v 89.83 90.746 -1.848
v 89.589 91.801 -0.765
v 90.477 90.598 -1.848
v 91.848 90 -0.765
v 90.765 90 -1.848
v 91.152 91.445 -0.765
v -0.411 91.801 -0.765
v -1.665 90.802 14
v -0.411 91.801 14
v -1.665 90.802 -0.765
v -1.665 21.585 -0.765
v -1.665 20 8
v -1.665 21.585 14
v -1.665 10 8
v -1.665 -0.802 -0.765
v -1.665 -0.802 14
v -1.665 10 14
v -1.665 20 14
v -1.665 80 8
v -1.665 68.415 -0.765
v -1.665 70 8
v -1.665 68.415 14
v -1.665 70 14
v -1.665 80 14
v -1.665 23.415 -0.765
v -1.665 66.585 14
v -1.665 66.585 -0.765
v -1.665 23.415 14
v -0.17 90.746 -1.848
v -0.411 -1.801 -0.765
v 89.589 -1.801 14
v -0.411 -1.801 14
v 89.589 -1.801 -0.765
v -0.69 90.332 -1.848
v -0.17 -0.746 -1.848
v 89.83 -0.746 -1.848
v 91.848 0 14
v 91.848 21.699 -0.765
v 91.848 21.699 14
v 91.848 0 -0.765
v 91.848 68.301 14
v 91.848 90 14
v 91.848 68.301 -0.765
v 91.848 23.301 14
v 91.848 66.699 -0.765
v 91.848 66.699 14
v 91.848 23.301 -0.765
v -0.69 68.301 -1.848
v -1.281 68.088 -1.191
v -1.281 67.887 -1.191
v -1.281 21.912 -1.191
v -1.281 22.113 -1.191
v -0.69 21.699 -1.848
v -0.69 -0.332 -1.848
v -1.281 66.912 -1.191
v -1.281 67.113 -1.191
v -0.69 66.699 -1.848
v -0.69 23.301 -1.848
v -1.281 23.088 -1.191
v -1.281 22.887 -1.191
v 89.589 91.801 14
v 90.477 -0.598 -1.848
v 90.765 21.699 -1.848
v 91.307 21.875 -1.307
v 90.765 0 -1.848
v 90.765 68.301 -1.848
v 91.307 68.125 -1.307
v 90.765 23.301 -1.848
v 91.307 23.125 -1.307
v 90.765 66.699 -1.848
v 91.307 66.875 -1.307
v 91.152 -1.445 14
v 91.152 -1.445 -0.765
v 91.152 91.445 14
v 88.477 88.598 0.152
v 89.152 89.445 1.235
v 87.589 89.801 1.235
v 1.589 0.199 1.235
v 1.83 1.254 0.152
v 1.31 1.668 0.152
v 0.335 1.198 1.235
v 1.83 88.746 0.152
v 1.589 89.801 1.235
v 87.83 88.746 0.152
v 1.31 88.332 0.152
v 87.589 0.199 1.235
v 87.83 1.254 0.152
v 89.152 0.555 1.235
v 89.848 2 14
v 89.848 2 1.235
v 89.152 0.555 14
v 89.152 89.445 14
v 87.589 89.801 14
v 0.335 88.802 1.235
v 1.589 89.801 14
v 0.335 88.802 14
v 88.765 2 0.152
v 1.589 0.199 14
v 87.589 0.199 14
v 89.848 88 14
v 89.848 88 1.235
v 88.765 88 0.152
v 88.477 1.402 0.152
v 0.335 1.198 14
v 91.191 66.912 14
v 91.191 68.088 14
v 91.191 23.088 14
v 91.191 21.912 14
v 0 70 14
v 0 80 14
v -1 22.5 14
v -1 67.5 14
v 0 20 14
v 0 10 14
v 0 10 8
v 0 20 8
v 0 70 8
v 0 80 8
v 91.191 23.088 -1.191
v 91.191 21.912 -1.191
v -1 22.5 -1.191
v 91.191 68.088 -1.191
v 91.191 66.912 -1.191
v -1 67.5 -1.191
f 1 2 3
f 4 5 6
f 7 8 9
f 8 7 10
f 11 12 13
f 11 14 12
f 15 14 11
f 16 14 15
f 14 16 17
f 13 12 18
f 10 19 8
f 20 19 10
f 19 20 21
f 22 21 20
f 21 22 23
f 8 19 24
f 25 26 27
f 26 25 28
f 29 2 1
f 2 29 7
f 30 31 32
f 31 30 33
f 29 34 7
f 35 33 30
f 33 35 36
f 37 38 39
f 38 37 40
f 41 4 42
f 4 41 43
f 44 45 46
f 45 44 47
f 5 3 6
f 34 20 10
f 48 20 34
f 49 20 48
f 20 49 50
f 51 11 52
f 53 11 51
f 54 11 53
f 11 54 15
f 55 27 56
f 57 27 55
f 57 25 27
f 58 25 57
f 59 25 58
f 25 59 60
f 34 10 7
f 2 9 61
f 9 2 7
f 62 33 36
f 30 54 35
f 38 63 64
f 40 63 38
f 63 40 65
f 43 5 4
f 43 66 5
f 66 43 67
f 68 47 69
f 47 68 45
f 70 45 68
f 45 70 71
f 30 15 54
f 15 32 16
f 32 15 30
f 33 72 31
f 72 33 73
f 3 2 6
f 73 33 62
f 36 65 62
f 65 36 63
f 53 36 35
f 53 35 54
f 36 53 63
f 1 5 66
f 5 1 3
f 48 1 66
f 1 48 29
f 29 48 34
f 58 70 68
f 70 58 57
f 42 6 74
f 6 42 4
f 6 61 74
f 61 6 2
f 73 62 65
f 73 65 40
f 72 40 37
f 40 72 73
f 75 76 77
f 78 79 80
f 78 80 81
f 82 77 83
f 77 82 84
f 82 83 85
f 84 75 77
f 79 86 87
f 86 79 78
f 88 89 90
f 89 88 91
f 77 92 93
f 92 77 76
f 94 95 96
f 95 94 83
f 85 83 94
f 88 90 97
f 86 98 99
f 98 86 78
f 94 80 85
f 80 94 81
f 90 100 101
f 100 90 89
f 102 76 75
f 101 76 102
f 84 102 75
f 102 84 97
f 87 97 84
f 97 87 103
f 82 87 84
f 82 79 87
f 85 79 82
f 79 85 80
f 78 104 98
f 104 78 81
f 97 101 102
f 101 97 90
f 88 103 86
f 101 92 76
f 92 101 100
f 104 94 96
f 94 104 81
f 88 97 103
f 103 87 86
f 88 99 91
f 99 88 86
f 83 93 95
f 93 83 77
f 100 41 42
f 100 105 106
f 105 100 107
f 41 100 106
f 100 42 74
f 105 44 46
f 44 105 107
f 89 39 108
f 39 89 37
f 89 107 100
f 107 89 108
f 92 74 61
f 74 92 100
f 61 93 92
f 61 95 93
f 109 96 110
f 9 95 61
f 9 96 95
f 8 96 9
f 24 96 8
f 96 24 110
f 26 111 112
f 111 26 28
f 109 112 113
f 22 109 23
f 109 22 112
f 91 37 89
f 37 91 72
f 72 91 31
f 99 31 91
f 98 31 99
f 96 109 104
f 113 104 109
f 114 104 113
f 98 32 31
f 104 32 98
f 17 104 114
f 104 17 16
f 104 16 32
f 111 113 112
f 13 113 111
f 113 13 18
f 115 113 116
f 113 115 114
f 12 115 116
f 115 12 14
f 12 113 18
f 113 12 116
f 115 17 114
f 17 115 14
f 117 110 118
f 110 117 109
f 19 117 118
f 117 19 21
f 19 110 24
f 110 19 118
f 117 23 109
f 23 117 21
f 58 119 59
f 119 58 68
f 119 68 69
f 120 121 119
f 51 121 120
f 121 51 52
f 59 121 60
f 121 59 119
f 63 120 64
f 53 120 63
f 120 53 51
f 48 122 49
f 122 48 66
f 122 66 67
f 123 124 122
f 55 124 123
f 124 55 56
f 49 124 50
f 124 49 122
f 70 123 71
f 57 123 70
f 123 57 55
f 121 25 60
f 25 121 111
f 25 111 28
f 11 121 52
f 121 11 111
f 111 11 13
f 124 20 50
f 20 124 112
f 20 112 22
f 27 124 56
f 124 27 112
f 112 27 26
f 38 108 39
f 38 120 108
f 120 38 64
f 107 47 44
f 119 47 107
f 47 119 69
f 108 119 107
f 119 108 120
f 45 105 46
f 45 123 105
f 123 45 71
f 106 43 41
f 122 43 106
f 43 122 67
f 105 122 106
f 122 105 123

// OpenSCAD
module box_part(height, hinge_height, hinge_width) {
    corner_radius=4;
    wall_thickness=2;
    cube_size=90;
    difference() {
        minkowski() {
          sphere(d=corner_radius);
          cube([cube_size,cube_size,height]);
        }
        //hollow
        translate([wall_thickness, wall_thickness, wall_thickness]) {
            minkowski() {
              sphere(d=corner_radius);
              cube([cube_size-2*wall_thickness, cube_size-2*wall_thickness, height + corner_radius]);
            }
        }
        translate([0-corner_radius, 0-corner_radius, height]) cube([cube_size+2*corner_radius,cube_size + 2*corner_radius,corner_radius]);
        
        translate([-wall_thickness/2, cube_size/6, height-hinge_height/2]) cube([wall_thickness, hinge_width, hinge_height], center=true);
        translate([-wall_thickness/2, cube_size*5/6, height-hinge_height/2]) cube([wall_thickness, hinge_width, hinge_height], center=true);
        //nooks for straps
        #translate([-2*wall_thickness, cube_size/4, -corner_radius/2]) rotate([0, 90, 0]) cylinder(r=1, h=cube_size+2*corner_radius, center=false);
        #translate([-2*wall_thickness, cube_size*3/4, -corner_radius/2]) rotate([0, 90, 0]) cylinder(r=1, h=cube_size+2*corner_radius, center=false);
        
        #translate([-wall_thickness, cube_size/4, -corner_radius/2]) cylinder(r=1, h=corner_radius+height, center=false);
        #translate([-wall_thickness, cube_size*3/4, -corner_radius/2]) cylinder(r=1, h=corner_radius+height, center=false);
        
        #translate([cube_size+wall_thickness, cube_size/4, -corner_radius/2]) cylinder(r=1, h=corner_radius+height, center=false);
        #translate([cube_size+wall_thickness, cube_size*3/4, -corner_radius/2]) cylinder(r=1, h=corner_radius+height, center=false);
    }
}

box_part(14, 6, 10);
